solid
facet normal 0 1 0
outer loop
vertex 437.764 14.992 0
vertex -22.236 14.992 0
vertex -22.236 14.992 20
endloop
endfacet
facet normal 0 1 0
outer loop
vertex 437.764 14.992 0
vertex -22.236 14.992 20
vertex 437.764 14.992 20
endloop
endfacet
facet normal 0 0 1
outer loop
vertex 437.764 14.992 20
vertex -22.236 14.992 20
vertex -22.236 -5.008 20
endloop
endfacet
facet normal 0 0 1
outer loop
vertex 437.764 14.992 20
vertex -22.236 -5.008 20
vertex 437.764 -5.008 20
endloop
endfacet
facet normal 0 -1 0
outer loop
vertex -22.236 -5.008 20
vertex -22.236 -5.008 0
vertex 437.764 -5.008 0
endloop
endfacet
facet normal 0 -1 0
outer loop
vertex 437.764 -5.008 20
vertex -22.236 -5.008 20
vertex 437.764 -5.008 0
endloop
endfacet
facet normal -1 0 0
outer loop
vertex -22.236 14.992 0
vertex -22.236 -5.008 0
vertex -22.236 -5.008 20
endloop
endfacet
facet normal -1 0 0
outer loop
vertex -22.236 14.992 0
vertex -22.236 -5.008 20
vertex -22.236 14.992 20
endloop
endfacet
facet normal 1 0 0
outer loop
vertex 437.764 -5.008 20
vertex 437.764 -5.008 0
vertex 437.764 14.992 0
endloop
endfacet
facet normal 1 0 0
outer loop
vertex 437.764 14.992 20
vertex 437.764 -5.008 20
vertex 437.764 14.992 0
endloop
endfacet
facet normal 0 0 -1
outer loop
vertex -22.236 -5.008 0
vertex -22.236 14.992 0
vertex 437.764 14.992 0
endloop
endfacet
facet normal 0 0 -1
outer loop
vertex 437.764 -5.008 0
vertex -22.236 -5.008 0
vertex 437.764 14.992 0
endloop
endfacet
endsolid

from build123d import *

# Parameters (mm, degrees)
F0_W     = 460
F0_H     = 20
F1_DEPTH = 20
F2_W     = 20
F2_H     = 300
F3_DEPTH = 20


with BuildPart() as f1:
    # F0 (on Top) → F1 (new body)
    with BuildSketch(Plane.XY):
        with Locations((207.763631, 4.992308)):
            Rectangle(F0_W, F0_H)
    extrude(amount=F1_DEPTH)


with BuildPart() as f3:
    # F2 (on Top) → F3 (new body)
    with BuildSketch(Plane.XY):
        with Locations((-106.786743, 76.74925)):
            Rectangle(F2_W, F2_H)
    extrude(amount=F3_DEPTH)


solid = f1.part
